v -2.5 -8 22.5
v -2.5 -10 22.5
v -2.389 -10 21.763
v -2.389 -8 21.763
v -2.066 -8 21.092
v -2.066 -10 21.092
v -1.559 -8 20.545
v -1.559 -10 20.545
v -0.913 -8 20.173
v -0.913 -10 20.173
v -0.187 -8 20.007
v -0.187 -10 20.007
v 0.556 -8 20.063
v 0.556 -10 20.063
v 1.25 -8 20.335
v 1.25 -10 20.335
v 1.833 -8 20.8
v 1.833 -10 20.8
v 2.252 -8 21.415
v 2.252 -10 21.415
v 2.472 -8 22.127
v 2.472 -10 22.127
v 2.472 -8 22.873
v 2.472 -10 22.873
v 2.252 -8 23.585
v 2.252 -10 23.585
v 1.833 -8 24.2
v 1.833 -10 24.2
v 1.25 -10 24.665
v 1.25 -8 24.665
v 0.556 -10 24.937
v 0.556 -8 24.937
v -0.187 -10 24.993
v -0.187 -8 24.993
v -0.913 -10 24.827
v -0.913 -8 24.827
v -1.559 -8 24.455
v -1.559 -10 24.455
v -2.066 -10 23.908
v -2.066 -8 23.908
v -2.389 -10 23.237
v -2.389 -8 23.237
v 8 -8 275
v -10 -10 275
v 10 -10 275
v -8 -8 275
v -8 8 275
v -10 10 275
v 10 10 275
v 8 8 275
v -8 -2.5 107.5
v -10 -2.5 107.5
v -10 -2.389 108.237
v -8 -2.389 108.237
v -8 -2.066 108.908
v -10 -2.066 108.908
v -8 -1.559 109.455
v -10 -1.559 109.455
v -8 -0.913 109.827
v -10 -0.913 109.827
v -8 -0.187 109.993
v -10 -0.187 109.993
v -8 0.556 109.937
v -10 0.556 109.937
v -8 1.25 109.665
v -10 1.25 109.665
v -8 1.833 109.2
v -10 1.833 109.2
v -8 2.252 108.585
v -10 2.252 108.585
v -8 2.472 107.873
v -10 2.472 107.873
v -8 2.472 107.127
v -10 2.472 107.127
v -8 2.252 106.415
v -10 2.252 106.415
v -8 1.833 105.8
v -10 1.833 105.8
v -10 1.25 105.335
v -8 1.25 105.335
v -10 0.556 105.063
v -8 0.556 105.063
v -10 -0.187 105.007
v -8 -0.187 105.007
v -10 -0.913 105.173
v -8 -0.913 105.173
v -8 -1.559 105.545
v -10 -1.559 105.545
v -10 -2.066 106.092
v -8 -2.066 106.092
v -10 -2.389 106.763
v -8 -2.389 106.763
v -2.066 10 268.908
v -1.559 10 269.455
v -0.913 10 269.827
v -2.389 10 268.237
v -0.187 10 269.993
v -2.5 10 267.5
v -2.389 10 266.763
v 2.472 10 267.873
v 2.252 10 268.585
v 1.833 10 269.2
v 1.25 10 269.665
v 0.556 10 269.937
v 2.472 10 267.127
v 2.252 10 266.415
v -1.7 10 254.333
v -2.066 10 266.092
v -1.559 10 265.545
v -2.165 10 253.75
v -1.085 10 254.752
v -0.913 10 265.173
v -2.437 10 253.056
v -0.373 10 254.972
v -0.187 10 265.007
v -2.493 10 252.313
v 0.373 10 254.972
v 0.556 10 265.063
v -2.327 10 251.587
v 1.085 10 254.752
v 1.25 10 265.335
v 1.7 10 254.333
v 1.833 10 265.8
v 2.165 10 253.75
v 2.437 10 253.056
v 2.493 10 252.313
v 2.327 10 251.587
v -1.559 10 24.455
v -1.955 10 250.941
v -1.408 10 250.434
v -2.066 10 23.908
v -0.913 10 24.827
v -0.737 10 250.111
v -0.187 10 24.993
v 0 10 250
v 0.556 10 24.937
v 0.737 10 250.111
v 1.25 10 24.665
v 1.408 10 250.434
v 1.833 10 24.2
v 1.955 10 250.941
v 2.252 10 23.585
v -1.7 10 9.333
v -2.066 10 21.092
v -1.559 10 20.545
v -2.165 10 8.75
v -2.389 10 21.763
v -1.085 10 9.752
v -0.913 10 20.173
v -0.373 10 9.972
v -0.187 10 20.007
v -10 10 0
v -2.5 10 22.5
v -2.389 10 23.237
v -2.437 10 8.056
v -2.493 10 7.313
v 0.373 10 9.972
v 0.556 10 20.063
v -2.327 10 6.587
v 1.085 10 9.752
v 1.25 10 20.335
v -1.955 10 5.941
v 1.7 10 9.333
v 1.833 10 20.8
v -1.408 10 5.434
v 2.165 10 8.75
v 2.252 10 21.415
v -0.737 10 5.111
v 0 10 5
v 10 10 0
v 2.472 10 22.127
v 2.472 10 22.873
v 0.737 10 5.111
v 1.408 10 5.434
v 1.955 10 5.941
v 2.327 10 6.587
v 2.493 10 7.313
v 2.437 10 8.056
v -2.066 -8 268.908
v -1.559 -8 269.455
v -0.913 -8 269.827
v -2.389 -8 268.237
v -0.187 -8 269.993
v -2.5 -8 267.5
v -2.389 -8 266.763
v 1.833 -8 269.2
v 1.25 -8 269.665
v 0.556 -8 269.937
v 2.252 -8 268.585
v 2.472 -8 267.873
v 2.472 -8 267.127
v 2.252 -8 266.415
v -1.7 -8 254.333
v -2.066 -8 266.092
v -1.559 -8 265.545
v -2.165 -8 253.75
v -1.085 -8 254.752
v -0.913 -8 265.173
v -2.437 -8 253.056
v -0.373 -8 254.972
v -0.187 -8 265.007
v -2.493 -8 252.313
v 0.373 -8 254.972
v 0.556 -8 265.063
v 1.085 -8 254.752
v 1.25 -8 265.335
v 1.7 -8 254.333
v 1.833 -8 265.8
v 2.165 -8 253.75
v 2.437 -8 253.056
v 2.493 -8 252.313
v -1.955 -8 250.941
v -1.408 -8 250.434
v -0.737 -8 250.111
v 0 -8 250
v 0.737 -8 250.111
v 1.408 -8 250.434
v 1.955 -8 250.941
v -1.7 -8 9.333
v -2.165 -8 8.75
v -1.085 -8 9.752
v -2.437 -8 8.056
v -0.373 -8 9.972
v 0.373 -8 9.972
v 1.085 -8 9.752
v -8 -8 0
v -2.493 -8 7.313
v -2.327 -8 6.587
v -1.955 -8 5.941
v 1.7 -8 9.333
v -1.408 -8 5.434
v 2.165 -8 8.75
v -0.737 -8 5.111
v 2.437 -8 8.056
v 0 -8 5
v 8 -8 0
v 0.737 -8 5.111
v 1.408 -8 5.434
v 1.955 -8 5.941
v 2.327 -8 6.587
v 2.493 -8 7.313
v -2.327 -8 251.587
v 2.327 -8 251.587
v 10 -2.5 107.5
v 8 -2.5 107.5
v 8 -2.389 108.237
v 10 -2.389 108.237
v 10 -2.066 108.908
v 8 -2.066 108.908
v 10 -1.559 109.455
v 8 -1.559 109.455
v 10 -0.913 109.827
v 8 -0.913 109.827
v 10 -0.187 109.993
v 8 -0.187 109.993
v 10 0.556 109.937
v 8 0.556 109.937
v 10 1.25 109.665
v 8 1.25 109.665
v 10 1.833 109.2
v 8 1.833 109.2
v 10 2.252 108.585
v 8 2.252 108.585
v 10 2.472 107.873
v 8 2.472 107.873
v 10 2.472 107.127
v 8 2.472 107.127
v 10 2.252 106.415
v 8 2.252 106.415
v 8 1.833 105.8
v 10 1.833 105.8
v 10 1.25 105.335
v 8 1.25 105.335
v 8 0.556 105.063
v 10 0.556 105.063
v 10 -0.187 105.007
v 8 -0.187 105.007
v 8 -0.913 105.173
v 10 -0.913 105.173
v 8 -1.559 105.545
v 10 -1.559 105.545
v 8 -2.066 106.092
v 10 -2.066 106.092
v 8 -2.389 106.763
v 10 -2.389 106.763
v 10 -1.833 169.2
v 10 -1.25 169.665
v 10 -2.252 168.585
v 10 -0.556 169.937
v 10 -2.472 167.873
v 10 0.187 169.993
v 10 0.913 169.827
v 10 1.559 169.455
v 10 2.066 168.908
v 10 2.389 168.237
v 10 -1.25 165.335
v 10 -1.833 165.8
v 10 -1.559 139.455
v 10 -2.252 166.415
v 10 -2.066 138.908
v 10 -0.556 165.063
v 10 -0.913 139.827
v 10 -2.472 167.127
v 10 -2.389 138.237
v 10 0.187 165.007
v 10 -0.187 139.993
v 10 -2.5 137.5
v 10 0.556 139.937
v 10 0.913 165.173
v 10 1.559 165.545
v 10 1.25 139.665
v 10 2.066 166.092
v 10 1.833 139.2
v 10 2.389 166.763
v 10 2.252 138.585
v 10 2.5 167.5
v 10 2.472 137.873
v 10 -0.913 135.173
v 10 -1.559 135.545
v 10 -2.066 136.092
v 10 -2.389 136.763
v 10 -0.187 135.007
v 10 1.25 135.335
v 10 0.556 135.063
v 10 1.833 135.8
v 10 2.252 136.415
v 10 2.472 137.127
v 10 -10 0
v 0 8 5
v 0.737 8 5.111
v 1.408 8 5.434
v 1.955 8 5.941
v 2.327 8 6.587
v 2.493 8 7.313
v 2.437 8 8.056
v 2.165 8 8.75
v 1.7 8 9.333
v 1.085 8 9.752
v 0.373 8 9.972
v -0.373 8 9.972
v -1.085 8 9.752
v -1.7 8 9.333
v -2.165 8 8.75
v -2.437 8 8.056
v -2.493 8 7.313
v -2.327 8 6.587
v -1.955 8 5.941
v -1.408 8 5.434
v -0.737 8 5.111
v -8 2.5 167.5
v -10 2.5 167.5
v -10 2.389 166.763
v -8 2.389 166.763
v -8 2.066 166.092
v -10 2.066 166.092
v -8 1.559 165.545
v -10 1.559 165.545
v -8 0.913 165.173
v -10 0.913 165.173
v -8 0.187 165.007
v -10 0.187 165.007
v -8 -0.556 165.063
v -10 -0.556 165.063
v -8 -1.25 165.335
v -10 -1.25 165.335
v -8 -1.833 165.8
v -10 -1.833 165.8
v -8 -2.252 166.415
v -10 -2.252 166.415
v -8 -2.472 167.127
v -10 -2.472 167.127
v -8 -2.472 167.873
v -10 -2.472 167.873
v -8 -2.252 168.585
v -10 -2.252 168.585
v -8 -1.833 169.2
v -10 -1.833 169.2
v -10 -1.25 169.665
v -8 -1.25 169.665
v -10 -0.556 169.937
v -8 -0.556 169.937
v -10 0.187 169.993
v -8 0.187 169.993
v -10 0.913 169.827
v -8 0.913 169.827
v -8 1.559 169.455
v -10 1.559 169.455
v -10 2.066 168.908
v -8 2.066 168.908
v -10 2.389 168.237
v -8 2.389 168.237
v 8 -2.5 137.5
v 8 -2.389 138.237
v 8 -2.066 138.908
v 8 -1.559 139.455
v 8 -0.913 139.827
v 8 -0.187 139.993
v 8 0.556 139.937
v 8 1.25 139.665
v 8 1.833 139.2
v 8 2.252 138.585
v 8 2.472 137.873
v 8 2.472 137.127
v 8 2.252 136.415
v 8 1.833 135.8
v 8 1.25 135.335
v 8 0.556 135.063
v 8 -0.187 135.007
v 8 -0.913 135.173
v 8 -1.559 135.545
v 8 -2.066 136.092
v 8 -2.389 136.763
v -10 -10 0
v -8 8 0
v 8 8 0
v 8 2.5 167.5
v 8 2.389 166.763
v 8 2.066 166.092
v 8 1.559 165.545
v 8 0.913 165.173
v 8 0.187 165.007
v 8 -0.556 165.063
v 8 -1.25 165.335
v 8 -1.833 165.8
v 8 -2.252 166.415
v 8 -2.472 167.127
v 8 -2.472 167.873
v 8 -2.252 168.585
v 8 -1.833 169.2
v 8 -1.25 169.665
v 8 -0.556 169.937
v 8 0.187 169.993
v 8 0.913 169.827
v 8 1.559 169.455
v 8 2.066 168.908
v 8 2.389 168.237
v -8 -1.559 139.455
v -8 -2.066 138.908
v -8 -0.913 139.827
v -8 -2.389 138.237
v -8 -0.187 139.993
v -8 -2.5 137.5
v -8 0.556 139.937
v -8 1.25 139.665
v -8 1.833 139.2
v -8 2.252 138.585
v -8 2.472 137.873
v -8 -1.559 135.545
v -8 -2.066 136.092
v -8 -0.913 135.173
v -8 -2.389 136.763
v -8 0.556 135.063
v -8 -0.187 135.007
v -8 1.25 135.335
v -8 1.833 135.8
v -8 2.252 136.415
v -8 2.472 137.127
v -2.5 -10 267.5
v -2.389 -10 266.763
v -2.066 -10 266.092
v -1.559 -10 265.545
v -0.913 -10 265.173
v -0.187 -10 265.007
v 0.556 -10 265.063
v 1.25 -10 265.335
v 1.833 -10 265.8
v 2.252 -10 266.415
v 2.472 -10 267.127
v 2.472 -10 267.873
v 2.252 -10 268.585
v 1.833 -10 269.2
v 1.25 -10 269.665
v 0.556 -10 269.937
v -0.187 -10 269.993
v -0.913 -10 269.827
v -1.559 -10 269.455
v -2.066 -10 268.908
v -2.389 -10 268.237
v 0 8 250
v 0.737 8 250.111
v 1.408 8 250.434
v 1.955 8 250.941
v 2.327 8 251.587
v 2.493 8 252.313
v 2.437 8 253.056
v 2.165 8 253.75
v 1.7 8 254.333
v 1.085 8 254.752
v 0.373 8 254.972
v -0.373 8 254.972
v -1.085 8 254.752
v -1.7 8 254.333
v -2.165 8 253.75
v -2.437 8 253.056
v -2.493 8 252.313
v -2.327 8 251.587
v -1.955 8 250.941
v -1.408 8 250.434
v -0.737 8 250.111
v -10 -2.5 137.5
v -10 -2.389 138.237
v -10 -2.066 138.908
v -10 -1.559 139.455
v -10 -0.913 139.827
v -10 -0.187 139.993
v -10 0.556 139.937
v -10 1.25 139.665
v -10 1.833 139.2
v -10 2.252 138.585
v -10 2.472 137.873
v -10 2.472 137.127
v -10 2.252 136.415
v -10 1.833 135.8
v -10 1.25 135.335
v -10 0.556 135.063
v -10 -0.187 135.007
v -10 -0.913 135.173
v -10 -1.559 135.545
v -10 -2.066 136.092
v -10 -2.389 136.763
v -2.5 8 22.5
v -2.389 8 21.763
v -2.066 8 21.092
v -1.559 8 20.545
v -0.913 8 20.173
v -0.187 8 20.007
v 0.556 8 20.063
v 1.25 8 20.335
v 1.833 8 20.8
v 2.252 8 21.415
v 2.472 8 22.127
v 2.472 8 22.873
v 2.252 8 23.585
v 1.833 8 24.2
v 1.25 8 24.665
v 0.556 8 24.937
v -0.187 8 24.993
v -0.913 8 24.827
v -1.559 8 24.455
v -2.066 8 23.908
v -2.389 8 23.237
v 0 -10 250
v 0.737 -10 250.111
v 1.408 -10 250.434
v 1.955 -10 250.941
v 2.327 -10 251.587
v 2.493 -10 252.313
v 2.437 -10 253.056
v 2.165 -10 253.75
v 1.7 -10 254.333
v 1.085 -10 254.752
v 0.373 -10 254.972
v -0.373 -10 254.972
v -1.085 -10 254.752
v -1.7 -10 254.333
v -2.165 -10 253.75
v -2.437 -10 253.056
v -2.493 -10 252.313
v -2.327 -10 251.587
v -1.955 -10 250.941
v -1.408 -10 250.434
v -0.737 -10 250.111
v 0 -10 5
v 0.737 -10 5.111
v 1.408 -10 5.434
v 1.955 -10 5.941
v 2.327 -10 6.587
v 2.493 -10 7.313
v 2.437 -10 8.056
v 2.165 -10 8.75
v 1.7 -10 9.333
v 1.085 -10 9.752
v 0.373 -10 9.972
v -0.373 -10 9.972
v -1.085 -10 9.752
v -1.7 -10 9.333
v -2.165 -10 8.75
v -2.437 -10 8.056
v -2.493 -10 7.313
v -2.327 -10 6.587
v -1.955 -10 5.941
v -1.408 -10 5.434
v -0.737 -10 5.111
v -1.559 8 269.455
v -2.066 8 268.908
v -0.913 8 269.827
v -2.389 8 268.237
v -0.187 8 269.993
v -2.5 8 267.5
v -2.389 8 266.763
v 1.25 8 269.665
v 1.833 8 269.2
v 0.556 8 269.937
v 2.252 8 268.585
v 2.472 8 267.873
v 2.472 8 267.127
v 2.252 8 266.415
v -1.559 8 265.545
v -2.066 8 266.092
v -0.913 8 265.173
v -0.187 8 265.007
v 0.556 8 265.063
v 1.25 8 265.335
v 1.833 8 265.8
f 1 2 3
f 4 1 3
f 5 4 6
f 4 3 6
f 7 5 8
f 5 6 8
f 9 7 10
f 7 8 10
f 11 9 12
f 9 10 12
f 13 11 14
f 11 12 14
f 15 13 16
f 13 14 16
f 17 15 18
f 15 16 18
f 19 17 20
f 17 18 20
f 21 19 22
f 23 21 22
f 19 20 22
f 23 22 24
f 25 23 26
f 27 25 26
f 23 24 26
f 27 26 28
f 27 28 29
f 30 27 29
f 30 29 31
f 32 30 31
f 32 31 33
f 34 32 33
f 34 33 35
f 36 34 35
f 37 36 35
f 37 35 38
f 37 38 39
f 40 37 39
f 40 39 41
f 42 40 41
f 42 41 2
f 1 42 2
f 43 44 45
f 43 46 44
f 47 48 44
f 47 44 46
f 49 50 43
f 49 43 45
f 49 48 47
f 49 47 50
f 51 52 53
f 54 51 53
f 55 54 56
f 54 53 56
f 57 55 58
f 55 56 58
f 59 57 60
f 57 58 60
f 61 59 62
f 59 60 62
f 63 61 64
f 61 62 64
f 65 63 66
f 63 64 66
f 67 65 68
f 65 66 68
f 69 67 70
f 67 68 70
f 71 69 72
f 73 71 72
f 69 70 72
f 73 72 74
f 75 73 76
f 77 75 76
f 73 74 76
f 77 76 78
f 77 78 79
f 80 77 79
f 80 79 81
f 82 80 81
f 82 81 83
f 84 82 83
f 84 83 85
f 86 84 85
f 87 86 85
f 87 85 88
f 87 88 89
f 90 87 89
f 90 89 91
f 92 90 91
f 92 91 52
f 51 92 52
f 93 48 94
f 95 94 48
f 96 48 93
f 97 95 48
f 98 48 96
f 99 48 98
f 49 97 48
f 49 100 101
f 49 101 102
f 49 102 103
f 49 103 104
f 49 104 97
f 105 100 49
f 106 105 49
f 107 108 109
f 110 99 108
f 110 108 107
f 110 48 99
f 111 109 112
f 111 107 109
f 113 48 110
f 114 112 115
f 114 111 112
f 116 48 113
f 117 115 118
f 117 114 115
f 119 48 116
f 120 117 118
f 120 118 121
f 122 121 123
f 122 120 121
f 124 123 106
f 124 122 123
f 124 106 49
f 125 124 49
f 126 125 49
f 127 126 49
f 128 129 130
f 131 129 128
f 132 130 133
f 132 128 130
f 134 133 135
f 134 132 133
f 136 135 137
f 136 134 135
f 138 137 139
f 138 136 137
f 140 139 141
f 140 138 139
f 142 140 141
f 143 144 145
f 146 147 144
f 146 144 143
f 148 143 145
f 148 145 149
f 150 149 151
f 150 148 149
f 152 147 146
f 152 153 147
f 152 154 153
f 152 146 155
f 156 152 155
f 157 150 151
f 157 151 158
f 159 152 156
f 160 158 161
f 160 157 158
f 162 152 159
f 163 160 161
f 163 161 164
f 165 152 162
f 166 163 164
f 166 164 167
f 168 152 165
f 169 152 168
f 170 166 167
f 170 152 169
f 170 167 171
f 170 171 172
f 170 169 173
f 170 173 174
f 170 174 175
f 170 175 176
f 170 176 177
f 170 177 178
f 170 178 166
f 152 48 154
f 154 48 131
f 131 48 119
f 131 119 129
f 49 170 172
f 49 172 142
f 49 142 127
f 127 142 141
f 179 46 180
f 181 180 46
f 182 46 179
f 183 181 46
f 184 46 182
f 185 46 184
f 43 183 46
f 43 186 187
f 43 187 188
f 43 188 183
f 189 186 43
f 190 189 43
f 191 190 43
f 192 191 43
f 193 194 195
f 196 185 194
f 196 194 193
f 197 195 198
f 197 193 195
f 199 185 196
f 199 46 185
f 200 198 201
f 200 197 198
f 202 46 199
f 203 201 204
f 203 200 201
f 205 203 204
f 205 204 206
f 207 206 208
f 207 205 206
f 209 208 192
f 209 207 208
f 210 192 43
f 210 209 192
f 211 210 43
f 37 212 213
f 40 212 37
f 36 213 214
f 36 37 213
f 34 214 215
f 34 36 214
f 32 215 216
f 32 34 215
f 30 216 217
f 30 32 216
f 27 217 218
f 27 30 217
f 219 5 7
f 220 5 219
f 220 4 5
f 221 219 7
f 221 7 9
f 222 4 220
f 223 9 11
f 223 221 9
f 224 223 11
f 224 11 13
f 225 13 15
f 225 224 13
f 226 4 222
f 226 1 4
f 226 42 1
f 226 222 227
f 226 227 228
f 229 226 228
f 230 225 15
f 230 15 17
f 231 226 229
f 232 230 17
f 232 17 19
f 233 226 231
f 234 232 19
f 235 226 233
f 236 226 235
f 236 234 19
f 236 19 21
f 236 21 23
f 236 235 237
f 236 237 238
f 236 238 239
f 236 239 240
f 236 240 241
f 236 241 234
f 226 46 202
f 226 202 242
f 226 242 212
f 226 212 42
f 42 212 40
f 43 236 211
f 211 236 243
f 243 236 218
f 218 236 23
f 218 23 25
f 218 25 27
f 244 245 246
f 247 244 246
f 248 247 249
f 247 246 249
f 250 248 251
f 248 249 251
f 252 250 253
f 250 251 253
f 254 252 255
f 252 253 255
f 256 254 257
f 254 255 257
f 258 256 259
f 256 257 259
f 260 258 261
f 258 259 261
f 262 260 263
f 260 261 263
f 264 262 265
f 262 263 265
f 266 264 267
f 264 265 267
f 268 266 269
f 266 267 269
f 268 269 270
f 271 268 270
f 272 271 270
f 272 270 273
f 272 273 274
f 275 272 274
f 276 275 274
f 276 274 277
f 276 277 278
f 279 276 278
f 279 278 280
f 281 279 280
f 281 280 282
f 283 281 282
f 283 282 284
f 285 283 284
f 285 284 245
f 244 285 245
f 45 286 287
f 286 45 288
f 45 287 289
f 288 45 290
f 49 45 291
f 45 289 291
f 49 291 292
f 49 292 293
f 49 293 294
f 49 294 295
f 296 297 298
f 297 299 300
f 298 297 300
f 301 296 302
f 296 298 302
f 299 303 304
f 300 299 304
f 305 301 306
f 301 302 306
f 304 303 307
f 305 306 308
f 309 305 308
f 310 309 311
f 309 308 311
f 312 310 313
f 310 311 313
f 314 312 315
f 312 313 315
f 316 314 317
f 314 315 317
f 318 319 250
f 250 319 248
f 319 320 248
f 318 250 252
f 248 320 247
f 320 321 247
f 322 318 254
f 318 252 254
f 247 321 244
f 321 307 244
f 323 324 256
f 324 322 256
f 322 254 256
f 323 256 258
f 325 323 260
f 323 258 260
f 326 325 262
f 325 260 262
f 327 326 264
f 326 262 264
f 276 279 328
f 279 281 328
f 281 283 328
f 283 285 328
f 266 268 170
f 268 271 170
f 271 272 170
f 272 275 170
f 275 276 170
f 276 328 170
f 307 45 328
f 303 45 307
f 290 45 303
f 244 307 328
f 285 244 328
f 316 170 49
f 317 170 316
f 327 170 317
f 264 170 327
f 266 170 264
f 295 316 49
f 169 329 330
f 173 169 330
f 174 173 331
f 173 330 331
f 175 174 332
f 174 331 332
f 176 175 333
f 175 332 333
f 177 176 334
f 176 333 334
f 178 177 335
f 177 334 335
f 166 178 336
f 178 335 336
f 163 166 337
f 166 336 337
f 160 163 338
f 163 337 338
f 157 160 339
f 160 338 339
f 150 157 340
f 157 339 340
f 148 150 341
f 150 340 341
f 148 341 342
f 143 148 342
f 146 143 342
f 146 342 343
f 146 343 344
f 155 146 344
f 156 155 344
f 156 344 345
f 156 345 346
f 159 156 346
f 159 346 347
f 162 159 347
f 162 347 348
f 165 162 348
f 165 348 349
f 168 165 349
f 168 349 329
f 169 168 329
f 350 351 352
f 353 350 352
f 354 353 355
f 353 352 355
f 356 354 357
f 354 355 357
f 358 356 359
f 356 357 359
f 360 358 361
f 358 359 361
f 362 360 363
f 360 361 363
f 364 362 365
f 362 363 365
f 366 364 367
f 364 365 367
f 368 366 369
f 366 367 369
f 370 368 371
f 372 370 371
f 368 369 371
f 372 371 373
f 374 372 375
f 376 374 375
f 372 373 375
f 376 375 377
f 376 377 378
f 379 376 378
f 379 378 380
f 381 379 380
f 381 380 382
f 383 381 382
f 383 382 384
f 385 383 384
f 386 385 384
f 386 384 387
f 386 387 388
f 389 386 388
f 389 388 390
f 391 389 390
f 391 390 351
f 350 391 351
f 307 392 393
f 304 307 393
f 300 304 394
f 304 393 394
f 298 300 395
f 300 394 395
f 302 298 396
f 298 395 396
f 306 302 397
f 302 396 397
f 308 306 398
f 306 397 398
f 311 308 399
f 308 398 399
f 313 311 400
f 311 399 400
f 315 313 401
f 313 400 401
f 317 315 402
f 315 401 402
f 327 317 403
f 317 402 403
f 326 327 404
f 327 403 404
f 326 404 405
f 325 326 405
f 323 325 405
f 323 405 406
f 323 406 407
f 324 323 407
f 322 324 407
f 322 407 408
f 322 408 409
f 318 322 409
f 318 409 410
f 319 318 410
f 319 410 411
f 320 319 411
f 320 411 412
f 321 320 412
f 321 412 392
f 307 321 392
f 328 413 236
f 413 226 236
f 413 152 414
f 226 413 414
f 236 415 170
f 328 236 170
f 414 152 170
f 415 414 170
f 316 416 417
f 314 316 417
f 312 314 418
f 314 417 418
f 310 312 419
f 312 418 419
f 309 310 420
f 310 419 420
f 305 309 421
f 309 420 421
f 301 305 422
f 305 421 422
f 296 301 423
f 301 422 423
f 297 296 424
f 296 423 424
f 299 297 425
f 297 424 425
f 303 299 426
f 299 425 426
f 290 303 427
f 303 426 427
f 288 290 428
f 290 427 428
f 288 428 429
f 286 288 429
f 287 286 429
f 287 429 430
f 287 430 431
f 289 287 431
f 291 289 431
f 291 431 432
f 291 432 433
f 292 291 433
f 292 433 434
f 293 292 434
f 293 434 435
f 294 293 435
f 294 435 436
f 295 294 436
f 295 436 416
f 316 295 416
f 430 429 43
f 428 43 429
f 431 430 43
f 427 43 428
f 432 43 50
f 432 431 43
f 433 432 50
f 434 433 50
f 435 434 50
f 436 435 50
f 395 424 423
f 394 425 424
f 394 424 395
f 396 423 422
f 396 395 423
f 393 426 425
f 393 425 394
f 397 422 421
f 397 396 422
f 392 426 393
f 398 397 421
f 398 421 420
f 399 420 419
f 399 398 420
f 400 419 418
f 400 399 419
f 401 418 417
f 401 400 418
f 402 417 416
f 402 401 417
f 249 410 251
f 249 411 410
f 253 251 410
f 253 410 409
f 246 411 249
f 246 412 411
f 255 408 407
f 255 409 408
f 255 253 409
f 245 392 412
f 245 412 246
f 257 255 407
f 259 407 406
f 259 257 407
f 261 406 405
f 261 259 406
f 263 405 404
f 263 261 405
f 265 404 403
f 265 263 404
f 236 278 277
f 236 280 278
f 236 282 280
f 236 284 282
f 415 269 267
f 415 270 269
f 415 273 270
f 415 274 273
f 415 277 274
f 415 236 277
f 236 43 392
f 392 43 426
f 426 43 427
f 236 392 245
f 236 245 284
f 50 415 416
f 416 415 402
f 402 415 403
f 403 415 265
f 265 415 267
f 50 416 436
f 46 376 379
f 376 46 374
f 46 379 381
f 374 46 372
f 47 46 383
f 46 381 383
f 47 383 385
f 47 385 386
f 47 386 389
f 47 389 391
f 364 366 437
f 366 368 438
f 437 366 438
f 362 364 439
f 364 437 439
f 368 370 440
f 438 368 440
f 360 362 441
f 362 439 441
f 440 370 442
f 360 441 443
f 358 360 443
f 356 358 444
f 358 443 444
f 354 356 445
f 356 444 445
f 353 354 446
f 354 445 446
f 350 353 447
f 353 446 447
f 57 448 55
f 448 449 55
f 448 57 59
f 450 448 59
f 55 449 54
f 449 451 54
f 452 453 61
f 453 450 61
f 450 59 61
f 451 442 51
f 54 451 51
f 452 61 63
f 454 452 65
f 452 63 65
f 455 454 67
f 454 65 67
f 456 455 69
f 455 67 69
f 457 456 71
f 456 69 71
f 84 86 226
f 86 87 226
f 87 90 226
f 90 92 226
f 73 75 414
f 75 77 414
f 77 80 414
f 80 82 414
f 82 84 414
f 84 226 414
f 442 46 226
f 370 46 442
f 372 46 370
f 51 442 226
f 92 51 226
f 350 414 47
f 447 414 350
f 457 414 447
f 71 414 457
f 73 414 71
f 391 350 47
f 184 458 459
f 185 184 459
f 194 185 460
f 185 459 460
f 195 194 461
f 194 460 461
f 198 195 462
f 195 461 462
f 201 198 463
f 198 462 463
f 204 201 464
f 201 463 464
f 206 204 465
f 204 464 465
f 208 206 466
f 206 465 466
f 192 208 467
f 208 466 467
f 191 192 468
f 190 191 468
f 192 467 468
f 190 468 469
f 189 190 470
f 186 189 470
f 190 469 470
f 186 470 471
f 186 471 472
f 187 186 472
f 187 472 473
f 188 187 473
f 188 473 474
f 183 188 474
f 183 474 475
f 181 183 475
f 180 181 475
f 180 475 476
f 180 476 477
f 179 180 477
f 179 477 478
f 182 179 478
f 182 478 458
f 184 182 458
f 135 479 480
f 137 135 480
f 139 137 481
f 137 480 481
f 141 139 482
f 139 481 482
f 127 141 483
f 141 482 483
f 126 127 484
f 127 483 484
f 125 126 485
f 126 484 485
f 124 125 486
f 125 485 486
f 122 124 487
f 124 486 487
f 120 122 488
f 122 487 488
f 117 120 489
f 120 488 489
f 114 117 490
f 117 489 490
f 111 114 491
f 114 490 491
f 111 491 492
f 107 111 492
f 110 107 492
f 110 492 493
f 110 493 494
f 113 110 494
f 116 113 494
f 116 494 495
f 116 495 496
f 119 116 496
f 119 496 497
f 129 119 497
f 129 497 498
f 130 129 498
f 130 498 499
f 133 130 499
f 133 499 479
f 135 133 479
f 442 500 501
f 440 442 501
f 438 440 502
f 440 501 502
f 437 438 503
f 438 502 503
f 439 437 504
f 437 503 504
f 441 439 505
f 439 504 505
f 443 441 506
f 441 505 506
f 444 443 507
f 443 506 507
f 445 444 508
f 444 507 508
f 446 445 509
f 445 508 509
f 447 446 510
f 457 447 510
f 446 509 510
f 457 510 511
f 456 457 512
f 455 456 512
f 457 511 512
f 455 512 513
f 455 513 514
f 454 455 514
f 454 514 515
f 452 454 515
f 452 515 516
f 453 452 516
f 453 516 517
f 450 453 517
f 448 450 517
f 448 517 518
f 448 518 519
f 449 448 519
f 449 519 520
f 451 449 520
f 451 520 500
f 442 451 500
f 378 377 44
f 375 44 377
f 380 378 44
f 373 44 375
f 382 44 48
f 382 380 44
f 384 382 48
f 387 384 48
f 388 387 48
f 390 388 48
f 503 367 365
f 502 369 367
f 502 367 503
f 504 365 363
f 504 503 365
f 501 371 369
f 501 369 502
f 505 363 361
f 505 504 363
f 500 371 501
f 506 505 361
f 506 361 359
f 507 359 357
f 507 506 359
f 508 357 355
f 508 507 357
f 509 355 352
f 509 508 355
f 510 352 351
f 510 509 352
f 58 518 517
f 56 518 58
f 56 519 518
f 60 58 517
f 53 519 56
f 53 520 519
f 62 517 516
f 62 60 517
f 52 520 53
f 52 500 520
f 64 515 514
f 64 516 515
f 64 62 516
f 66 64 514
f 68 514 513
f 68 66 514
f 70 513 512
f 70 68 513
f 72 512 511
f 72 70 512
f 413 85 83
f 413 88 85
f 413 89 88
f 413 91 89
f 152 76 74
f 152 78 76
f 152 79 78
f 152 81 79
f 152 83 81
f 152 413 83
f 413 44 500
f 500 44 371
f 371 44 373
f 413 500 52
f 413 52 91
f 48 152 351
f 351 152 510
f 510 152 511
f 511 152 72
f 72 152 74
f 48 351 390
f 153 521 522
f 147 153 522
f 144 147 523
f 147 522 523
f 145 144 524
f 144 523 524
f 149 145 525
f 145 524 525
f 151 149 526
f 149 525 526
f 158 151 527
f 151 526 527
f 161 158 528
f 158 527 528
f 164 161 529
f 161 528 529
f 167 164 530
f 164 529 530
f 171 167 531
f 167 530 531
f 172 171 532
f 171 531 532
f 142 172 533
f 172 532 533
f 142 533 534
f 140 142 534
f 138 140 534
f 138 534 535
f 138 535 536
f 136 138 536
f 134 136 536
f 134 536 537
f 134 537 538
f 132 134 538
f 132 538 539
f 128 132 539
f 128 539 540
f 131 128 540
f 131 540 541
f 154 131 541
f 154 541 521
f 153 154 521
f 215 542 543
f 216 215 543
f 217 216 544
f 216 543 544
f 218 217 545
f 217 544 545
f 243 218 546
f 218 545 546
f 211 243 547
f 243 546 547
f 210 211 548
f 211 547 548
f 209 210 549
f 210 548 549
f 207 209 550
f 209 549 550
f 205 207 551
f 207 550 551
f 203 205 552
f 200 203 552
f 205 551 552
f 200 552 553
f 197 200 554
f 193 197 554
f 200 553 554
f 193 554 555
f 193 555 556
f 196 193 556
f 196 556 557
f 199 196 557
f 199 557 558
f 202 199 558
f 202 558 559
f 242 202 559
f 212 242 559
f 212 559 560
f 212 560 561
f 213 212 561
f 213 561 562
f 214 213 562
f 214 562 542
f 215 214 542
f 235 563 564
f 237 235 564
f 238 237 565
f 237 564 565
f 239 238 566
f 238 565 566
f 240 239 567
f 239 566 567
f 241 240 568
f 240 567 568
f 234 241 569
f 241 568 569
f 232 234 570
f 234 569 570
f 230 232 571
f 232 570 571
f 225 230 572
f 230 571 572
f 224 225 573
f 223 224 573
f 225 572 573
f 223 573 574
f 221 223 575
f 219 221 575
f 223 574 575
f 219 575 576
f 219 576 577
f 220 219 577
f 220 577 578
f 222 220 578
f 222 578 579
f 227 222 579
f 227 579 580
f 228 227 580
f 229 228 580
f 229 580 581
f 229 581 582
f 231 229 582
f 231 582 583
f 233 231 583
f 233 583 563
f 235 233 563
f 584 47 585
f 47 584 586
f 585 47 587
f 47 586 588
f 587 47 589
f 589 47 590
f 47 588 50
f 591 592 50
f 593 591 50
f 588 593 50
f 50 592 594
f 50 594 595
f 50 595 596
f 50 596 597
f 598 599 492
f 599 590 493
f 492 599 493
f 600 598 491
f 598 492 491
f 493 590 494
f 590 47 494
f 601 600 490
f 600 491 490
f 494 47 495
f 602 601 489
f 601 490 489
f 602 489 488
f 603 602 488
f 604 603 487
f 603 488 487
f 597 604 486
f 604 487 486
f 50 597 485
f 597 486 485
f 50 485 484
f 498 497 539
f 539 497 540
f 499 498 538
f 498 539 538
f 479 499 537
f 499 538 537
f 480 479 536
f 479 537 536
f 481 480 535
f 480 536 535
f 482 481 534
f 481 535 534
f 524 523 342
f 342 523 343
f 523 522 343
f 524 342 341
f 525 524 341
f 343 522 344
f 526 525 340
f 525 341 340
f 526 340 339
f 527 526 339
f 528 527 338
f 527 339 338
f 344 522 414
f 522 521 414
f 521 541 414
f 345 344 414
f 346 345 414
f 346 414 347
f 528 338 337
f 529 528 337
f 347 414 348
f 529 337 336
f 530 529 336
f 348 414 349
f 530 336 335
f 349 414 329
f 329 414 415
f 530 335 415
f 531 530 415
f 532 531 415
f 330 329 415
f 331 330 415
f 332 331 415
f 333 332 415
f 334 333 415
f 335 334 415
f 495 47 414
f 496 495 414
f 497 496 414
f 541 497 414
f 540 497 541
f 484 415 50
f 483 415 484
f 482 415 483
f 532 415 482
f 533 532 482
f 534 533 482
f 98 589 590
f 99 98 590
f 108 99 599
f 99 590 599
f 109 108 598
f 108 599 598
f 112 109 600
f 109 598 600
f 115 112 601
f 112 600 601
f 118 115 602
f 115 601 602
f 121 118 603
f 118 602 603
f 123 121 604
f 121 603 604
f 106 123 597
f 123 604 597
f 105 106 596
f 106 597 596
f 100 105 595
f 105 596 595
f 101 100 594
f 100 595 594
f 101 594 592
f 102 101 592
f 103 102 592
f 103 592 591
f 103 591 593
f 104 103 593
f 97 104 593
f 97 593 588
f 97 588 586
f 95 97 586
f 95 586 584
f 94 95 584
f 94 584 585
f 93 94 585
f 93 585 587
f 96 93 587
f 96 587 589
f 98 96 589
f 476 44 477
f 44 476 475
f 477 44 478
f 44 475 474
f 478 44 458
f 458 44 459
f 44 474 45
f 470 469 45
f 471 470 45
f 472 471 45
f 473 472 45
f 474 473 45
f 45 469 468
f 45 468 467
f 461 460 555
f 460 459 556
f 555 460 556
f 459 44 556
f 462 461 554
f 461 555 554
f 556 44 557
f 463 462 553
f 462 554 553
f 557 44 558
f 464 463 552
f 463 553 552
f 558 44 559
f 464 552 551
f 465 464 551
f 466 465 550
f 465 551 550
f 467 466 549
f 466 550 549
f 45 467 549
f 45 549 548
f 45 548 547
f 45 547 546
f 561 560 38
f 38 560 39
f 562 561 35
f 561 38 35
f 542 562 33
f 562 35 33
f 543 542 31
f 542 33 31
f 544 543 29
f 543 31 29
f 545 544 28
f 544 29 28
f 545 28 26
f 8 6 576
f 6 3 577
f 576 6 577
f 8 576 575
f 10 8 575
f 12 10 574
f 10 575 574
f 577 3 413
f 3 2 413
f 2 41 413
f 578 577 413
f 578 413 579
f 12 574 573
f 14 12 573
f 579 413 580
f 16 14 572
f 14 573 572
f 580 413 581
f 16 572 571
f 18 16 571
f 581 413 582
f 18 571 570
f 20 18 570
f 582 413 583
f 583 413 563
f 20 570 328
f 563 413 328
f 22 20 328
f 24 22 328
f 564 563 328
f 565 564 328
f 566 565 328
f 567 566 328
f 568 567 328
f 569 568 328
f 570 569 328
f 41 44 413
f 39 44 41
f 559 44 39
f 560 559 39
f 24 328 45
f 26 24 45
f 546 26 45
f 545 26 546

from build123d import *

# Parameters (mm, degrees)
SKETCH_1_W          = 20
SKETCH_1_H          = 20
SKETCH_1_W_2        = 16
SKETCH_1_H_2        = 16
EXTRUDE_1_DEPTH     = 275
SKETCH_3_R          = 2.5
CUT_EXTRUDE_2_DEPTH = 276.907593226
SKETCH_4_R          = 2.5
CUT_EXTRUDE_3_DEPTH = 276.907593226


with BuildPart() as part:
    # 草图1 → 凸台-拉伸1 (new body)
    with BuildSketch(Plane.XY):
        Rectangle(SKETCH_1_W, SKETCH_1_H)
        Rectangle(SKETCH_1_W_2, SKETCH_1_H_2, mode=Mode.SUBTRACT)
    extrude(amount=EXTRUDE_1_DEPTH)

    # 草图3 → 切除-拉伸2 (cut, through all)
    with BuildSketch(Plane.XZ.offset(10)):
        with Locations(Location((0, 7.5, 0), (0, 0, 270))):
            Circle(SKETCH_3_R)
        with Locations(Location((0, 267.5, 0), (0, 0, 180))):
            Circle(SKETCH_3_R)
        with Locations(Location((0, 22.5, 0), (0, 0, 180))):
            Circle(SKETCH_3_R)
        with Locations(Location((0, 252.5, 0), (0, 0, 270))):
            Circle(SKETCH_3_R)
    extrude(amount=-CUT_EXTRUDE_2_DEPTH, mode=Mode.SUBTRACT)

    # 草图4 → 切除-拉伸3 (cut, through all)
    with BuildSketch(Plane.ZY.offset(10)):
        with Locations(Location((107.5, 0, 0), (0, 0, 270))):
            Circle(SKETCH_4_R)
        with Locations(Location((167.5, 0, 0), (0, 0, 90))):
            Circle(SKETCH_4_R)
        with Locations(Location((137.5, 0, 0), (0, 0, 270))):
            Circle(SKETCH_4_R)
    extrude(amount=-CUT_EXTRUDE_3_DEPTH, mode=Mode.SUBTRACT)


solid = part.part
